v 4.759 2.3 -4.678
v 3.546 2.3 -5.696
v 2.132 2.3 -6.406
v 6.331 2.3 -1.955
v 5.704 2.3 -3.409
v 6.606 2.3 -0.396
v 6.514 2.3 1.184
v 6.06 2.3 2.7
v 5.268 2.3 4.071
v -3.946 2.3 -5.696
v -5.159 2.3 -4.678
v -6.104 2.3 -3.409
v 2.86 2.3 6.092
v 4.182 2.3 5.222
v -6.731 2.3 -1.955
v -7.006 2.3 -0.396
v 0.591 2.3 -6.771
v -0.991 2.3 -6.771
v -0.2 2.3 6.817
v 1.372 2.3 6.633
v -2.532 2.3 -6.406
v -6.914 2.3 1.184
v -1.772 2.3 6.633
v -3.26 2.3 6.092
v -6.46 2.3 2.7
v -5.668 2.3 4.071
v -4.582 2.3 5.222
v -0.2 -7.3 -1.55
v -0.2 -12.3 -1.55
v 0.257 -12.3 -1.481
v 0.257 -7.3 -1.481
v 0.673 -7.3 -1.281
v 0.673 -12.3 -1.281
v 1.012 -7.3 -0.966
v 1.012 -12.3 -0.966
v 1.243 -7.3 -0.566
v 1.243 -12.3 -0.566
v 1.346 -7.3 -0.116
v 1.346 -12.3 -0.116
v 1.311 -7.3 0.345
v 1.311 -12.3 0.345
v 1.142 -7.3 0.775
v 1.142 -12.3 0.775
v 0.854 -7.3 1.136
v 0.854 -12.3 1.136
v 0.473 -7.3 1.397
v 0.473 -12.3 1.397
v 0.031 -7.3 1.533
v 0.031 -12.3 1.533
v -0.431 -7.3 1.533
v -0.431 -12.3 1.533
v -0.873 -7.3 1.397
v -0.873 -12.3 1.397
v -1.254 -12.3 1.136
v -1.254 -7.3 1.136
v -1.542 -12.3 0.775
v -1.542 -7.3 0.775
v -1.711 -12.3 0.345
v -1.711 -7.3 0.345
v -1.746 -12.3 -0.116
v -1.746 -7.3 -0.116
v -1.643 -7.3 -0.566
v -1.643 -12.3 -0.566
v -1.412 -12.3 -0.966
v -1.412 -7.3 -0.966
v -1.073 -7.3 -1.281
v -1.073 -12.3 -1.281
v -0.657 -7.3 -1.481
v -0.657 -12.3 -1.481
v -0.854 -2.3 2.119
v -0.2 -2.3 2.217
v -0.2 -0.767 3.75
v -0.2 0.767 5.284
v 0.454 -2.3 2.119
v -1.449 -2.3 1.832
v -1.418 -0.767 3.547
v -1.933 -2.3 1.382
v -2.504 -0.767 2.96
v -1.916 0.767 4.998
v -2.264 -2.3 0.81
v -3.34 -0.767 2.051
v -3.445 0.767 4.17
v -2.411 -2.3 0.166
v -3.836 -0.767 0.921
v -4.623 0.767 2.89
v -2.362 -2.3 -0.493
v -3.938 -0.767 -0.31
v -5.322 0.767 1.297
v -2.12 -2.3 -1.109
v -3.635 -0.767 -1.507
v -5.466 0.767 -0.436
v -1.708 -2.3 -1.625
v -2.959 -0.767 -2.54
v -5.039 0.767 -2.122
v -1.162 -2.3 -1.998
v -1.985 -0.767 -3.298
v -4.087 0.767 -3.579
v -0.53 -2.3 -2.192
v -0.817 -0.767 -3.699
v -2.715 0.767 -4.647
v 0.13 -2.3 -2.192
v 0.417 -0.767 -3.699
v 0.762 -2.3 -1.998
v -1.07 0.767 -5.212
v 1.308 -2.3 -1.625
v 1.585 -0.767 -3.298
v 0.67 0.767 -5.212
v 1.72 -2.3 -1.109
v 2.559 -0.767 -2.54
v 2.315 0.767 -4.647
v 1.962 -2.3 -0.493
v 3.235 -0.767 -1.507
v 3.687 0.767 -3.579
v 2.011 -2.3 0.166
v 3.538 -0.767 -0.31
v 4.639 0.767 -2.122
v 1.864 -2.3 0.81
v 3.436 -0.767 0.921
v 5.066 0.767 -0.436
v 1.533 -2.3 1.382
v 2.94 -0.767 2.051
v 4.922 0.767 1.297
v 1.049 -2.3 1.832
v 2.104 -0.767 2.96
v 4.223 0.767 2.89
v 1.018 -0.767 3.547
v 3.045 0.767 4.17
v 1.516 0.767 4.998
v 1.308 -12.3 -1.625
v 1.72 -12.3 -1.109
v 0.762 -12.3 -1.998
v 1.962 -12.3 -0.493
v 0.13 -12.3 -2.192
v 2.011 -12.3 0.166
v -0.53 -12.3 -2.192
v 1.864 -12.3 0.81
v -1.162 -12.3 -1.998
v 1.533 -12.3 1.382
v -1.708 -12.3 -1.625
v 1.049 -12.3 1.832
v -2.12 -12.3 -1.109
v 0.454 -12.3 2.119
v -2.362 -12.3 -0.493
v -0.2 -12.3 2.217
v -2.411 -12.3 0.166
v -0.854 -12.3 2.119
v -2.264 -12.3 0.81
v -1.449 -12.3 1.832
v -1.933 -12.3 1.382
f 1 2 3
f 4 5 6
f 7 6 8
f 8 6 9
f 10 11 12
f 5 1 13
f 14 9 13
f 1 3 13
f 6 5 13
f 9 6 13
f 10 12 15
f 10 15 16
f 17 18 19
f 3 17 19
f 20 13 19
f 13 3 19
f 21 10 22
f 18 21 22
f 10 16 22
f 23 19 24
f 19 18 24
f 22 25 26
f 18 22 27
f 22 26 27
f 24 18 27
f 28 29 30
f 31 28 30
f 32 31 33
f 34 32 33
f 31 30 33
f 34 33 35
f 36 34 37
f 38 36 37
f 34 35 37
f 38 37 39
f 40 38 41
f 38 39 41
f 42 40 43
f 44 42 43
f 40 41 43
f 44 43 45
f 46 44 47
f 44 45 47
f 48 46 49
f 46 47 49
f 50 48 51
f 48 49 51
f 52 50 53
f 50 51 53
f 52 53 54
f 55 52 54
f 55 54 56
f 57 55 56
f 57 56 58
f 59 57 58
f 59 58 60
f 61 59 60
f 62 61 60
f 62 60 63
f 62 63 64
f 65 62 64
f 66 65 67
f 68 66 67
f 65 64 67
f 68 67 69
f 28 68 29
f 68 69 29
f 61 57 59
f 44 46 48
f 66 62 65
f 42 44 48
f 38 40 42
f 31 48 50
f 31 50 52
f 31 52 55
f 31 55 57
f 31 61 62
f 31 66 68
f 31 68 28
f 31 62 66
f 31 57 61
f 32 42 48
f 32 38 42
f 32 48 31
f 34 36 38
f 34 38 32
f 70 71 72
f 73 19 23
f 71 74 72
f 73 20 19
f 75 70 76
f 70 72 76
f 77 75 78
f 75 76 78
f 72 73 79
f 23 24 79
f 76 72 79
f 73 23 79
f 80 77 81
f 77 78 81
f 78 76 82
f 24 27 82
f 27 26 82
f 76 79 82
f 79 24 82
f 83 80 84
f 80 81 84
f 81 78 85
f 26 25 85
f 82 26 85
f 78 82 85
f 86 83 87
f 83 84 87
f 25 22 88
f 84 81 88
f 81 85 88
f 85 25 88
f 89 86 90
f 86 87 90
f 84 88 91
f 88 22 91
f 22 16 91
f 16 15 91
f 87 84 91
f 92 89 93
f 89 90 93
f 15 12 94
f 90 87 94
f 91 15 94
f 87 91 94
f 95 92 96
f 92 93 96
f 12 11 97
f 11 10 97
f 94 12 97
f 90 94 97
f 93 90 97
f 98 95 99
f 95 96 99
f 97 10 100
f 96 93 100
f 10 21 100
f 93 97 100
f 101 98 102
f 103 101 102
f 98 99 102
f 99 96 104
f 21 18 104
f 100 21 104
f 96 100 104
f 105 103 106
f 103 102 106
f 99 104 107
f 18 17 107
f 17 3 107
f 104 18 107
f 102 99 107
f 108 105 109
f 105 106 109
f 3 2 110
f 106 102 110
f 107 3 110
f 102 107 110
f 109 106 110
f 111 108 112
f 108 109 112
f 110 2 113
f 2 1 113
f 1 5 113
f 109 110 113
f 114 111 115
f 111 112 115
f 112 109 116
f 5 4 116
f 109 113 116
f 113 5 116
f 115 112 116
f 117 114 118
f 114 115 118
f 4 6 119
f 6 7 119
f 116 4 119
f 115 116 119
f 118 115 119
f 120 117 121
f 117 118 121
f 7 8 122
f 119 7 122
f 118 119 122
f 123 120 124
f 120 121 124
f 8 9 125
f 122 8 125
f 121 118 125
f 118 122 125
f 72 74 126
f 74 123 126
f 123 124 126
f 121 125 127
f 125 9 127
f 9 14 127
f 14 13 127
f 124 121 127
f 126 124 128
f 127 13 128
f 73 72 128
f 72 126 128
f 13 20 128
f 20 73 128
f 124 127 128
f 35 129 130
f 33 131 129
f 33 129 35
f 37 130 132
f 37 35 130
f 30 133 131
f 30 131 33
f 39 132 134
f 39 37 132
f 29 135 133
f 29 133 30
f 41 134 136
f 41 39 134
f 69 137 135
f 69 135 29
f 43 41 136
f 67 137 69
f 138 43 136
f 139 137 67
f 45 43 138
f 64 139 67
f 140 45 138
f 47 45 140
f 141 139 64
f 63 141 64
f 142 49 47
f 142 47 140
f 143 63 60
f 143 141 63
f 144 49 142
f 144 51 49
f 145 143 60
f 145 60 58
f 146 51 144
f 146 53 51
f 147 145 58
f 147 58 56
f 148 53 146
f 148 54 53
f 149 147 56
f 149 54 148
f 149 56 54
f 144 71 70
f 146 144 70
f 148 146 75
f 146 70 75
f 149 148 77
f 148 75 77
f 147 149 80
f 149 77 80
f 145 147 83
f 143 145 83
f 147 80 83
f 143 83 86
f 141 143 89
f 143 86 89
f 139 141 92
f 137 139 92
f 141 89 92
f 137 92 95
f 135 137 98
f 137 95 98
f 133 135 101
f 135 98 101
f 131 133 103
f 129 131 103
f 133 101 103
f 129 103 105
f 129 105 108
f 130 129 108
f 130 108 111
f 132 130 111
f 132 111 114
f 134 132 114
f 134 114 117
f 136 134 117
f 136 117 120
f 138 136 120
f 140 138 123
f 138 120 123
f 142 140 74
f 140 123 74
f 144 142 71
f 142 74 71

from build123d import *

# Parameters (mm, degrees)
SKETCH2_R           = 2.217157288
BOSS_EXTRUDE1_DEPTH = 10
SKETCH3_R           = 1.55
BOSS_EXTRUDE2_DEPTH = 3
SKETCH3_2_R         = 1.55
CUT_EXTRUDE1_DEPTH  = 5


with BuildPart() as part:
    # Sketch1 → Revolve1 (revolve)
    with BuildSketch(Plane.XY):
        Polygon((-0.2, 2.3), (-0.2, -2.3), (-2.417157288, -2.3), (-7.017157288, 2.3), align=None)
    revolve(axis=Axis((-0.2, 2.3, 0), (0, -1, 0)))

    # Sketch2 → Boss-Extrude1 (add)
    with BuildSketch(Plane.XZ.offset(2.3)):
        with Locations((-0.2, 0)):
            Circle(SKETCH2_R)
    extrude(amount=BOSS_EXTRUDE1_DEPTH)

    # Sketch3 → Boss-Extrude2 (add)
    with BuildSketch(Plane.XZ.offset(12.3)):
        with Locations((-0.2, 0)):
            Circle(SKETCH3_R)
    extrude(amount=-BOSS_EXTRUDE2_DEPTH)

    # Sketch3<2> → Cut-Extrude1 (cut)
    with BuildSketch(Plane.XZ.offset(12.3)):
        with Locations((-0.2, 0)):
            Circle(SKETCH3_2_R)
    extrude(amount=-CUT_EXTRUDE1_DEPTH, mode=Mode.SUBTRACT)


solid = part.part
